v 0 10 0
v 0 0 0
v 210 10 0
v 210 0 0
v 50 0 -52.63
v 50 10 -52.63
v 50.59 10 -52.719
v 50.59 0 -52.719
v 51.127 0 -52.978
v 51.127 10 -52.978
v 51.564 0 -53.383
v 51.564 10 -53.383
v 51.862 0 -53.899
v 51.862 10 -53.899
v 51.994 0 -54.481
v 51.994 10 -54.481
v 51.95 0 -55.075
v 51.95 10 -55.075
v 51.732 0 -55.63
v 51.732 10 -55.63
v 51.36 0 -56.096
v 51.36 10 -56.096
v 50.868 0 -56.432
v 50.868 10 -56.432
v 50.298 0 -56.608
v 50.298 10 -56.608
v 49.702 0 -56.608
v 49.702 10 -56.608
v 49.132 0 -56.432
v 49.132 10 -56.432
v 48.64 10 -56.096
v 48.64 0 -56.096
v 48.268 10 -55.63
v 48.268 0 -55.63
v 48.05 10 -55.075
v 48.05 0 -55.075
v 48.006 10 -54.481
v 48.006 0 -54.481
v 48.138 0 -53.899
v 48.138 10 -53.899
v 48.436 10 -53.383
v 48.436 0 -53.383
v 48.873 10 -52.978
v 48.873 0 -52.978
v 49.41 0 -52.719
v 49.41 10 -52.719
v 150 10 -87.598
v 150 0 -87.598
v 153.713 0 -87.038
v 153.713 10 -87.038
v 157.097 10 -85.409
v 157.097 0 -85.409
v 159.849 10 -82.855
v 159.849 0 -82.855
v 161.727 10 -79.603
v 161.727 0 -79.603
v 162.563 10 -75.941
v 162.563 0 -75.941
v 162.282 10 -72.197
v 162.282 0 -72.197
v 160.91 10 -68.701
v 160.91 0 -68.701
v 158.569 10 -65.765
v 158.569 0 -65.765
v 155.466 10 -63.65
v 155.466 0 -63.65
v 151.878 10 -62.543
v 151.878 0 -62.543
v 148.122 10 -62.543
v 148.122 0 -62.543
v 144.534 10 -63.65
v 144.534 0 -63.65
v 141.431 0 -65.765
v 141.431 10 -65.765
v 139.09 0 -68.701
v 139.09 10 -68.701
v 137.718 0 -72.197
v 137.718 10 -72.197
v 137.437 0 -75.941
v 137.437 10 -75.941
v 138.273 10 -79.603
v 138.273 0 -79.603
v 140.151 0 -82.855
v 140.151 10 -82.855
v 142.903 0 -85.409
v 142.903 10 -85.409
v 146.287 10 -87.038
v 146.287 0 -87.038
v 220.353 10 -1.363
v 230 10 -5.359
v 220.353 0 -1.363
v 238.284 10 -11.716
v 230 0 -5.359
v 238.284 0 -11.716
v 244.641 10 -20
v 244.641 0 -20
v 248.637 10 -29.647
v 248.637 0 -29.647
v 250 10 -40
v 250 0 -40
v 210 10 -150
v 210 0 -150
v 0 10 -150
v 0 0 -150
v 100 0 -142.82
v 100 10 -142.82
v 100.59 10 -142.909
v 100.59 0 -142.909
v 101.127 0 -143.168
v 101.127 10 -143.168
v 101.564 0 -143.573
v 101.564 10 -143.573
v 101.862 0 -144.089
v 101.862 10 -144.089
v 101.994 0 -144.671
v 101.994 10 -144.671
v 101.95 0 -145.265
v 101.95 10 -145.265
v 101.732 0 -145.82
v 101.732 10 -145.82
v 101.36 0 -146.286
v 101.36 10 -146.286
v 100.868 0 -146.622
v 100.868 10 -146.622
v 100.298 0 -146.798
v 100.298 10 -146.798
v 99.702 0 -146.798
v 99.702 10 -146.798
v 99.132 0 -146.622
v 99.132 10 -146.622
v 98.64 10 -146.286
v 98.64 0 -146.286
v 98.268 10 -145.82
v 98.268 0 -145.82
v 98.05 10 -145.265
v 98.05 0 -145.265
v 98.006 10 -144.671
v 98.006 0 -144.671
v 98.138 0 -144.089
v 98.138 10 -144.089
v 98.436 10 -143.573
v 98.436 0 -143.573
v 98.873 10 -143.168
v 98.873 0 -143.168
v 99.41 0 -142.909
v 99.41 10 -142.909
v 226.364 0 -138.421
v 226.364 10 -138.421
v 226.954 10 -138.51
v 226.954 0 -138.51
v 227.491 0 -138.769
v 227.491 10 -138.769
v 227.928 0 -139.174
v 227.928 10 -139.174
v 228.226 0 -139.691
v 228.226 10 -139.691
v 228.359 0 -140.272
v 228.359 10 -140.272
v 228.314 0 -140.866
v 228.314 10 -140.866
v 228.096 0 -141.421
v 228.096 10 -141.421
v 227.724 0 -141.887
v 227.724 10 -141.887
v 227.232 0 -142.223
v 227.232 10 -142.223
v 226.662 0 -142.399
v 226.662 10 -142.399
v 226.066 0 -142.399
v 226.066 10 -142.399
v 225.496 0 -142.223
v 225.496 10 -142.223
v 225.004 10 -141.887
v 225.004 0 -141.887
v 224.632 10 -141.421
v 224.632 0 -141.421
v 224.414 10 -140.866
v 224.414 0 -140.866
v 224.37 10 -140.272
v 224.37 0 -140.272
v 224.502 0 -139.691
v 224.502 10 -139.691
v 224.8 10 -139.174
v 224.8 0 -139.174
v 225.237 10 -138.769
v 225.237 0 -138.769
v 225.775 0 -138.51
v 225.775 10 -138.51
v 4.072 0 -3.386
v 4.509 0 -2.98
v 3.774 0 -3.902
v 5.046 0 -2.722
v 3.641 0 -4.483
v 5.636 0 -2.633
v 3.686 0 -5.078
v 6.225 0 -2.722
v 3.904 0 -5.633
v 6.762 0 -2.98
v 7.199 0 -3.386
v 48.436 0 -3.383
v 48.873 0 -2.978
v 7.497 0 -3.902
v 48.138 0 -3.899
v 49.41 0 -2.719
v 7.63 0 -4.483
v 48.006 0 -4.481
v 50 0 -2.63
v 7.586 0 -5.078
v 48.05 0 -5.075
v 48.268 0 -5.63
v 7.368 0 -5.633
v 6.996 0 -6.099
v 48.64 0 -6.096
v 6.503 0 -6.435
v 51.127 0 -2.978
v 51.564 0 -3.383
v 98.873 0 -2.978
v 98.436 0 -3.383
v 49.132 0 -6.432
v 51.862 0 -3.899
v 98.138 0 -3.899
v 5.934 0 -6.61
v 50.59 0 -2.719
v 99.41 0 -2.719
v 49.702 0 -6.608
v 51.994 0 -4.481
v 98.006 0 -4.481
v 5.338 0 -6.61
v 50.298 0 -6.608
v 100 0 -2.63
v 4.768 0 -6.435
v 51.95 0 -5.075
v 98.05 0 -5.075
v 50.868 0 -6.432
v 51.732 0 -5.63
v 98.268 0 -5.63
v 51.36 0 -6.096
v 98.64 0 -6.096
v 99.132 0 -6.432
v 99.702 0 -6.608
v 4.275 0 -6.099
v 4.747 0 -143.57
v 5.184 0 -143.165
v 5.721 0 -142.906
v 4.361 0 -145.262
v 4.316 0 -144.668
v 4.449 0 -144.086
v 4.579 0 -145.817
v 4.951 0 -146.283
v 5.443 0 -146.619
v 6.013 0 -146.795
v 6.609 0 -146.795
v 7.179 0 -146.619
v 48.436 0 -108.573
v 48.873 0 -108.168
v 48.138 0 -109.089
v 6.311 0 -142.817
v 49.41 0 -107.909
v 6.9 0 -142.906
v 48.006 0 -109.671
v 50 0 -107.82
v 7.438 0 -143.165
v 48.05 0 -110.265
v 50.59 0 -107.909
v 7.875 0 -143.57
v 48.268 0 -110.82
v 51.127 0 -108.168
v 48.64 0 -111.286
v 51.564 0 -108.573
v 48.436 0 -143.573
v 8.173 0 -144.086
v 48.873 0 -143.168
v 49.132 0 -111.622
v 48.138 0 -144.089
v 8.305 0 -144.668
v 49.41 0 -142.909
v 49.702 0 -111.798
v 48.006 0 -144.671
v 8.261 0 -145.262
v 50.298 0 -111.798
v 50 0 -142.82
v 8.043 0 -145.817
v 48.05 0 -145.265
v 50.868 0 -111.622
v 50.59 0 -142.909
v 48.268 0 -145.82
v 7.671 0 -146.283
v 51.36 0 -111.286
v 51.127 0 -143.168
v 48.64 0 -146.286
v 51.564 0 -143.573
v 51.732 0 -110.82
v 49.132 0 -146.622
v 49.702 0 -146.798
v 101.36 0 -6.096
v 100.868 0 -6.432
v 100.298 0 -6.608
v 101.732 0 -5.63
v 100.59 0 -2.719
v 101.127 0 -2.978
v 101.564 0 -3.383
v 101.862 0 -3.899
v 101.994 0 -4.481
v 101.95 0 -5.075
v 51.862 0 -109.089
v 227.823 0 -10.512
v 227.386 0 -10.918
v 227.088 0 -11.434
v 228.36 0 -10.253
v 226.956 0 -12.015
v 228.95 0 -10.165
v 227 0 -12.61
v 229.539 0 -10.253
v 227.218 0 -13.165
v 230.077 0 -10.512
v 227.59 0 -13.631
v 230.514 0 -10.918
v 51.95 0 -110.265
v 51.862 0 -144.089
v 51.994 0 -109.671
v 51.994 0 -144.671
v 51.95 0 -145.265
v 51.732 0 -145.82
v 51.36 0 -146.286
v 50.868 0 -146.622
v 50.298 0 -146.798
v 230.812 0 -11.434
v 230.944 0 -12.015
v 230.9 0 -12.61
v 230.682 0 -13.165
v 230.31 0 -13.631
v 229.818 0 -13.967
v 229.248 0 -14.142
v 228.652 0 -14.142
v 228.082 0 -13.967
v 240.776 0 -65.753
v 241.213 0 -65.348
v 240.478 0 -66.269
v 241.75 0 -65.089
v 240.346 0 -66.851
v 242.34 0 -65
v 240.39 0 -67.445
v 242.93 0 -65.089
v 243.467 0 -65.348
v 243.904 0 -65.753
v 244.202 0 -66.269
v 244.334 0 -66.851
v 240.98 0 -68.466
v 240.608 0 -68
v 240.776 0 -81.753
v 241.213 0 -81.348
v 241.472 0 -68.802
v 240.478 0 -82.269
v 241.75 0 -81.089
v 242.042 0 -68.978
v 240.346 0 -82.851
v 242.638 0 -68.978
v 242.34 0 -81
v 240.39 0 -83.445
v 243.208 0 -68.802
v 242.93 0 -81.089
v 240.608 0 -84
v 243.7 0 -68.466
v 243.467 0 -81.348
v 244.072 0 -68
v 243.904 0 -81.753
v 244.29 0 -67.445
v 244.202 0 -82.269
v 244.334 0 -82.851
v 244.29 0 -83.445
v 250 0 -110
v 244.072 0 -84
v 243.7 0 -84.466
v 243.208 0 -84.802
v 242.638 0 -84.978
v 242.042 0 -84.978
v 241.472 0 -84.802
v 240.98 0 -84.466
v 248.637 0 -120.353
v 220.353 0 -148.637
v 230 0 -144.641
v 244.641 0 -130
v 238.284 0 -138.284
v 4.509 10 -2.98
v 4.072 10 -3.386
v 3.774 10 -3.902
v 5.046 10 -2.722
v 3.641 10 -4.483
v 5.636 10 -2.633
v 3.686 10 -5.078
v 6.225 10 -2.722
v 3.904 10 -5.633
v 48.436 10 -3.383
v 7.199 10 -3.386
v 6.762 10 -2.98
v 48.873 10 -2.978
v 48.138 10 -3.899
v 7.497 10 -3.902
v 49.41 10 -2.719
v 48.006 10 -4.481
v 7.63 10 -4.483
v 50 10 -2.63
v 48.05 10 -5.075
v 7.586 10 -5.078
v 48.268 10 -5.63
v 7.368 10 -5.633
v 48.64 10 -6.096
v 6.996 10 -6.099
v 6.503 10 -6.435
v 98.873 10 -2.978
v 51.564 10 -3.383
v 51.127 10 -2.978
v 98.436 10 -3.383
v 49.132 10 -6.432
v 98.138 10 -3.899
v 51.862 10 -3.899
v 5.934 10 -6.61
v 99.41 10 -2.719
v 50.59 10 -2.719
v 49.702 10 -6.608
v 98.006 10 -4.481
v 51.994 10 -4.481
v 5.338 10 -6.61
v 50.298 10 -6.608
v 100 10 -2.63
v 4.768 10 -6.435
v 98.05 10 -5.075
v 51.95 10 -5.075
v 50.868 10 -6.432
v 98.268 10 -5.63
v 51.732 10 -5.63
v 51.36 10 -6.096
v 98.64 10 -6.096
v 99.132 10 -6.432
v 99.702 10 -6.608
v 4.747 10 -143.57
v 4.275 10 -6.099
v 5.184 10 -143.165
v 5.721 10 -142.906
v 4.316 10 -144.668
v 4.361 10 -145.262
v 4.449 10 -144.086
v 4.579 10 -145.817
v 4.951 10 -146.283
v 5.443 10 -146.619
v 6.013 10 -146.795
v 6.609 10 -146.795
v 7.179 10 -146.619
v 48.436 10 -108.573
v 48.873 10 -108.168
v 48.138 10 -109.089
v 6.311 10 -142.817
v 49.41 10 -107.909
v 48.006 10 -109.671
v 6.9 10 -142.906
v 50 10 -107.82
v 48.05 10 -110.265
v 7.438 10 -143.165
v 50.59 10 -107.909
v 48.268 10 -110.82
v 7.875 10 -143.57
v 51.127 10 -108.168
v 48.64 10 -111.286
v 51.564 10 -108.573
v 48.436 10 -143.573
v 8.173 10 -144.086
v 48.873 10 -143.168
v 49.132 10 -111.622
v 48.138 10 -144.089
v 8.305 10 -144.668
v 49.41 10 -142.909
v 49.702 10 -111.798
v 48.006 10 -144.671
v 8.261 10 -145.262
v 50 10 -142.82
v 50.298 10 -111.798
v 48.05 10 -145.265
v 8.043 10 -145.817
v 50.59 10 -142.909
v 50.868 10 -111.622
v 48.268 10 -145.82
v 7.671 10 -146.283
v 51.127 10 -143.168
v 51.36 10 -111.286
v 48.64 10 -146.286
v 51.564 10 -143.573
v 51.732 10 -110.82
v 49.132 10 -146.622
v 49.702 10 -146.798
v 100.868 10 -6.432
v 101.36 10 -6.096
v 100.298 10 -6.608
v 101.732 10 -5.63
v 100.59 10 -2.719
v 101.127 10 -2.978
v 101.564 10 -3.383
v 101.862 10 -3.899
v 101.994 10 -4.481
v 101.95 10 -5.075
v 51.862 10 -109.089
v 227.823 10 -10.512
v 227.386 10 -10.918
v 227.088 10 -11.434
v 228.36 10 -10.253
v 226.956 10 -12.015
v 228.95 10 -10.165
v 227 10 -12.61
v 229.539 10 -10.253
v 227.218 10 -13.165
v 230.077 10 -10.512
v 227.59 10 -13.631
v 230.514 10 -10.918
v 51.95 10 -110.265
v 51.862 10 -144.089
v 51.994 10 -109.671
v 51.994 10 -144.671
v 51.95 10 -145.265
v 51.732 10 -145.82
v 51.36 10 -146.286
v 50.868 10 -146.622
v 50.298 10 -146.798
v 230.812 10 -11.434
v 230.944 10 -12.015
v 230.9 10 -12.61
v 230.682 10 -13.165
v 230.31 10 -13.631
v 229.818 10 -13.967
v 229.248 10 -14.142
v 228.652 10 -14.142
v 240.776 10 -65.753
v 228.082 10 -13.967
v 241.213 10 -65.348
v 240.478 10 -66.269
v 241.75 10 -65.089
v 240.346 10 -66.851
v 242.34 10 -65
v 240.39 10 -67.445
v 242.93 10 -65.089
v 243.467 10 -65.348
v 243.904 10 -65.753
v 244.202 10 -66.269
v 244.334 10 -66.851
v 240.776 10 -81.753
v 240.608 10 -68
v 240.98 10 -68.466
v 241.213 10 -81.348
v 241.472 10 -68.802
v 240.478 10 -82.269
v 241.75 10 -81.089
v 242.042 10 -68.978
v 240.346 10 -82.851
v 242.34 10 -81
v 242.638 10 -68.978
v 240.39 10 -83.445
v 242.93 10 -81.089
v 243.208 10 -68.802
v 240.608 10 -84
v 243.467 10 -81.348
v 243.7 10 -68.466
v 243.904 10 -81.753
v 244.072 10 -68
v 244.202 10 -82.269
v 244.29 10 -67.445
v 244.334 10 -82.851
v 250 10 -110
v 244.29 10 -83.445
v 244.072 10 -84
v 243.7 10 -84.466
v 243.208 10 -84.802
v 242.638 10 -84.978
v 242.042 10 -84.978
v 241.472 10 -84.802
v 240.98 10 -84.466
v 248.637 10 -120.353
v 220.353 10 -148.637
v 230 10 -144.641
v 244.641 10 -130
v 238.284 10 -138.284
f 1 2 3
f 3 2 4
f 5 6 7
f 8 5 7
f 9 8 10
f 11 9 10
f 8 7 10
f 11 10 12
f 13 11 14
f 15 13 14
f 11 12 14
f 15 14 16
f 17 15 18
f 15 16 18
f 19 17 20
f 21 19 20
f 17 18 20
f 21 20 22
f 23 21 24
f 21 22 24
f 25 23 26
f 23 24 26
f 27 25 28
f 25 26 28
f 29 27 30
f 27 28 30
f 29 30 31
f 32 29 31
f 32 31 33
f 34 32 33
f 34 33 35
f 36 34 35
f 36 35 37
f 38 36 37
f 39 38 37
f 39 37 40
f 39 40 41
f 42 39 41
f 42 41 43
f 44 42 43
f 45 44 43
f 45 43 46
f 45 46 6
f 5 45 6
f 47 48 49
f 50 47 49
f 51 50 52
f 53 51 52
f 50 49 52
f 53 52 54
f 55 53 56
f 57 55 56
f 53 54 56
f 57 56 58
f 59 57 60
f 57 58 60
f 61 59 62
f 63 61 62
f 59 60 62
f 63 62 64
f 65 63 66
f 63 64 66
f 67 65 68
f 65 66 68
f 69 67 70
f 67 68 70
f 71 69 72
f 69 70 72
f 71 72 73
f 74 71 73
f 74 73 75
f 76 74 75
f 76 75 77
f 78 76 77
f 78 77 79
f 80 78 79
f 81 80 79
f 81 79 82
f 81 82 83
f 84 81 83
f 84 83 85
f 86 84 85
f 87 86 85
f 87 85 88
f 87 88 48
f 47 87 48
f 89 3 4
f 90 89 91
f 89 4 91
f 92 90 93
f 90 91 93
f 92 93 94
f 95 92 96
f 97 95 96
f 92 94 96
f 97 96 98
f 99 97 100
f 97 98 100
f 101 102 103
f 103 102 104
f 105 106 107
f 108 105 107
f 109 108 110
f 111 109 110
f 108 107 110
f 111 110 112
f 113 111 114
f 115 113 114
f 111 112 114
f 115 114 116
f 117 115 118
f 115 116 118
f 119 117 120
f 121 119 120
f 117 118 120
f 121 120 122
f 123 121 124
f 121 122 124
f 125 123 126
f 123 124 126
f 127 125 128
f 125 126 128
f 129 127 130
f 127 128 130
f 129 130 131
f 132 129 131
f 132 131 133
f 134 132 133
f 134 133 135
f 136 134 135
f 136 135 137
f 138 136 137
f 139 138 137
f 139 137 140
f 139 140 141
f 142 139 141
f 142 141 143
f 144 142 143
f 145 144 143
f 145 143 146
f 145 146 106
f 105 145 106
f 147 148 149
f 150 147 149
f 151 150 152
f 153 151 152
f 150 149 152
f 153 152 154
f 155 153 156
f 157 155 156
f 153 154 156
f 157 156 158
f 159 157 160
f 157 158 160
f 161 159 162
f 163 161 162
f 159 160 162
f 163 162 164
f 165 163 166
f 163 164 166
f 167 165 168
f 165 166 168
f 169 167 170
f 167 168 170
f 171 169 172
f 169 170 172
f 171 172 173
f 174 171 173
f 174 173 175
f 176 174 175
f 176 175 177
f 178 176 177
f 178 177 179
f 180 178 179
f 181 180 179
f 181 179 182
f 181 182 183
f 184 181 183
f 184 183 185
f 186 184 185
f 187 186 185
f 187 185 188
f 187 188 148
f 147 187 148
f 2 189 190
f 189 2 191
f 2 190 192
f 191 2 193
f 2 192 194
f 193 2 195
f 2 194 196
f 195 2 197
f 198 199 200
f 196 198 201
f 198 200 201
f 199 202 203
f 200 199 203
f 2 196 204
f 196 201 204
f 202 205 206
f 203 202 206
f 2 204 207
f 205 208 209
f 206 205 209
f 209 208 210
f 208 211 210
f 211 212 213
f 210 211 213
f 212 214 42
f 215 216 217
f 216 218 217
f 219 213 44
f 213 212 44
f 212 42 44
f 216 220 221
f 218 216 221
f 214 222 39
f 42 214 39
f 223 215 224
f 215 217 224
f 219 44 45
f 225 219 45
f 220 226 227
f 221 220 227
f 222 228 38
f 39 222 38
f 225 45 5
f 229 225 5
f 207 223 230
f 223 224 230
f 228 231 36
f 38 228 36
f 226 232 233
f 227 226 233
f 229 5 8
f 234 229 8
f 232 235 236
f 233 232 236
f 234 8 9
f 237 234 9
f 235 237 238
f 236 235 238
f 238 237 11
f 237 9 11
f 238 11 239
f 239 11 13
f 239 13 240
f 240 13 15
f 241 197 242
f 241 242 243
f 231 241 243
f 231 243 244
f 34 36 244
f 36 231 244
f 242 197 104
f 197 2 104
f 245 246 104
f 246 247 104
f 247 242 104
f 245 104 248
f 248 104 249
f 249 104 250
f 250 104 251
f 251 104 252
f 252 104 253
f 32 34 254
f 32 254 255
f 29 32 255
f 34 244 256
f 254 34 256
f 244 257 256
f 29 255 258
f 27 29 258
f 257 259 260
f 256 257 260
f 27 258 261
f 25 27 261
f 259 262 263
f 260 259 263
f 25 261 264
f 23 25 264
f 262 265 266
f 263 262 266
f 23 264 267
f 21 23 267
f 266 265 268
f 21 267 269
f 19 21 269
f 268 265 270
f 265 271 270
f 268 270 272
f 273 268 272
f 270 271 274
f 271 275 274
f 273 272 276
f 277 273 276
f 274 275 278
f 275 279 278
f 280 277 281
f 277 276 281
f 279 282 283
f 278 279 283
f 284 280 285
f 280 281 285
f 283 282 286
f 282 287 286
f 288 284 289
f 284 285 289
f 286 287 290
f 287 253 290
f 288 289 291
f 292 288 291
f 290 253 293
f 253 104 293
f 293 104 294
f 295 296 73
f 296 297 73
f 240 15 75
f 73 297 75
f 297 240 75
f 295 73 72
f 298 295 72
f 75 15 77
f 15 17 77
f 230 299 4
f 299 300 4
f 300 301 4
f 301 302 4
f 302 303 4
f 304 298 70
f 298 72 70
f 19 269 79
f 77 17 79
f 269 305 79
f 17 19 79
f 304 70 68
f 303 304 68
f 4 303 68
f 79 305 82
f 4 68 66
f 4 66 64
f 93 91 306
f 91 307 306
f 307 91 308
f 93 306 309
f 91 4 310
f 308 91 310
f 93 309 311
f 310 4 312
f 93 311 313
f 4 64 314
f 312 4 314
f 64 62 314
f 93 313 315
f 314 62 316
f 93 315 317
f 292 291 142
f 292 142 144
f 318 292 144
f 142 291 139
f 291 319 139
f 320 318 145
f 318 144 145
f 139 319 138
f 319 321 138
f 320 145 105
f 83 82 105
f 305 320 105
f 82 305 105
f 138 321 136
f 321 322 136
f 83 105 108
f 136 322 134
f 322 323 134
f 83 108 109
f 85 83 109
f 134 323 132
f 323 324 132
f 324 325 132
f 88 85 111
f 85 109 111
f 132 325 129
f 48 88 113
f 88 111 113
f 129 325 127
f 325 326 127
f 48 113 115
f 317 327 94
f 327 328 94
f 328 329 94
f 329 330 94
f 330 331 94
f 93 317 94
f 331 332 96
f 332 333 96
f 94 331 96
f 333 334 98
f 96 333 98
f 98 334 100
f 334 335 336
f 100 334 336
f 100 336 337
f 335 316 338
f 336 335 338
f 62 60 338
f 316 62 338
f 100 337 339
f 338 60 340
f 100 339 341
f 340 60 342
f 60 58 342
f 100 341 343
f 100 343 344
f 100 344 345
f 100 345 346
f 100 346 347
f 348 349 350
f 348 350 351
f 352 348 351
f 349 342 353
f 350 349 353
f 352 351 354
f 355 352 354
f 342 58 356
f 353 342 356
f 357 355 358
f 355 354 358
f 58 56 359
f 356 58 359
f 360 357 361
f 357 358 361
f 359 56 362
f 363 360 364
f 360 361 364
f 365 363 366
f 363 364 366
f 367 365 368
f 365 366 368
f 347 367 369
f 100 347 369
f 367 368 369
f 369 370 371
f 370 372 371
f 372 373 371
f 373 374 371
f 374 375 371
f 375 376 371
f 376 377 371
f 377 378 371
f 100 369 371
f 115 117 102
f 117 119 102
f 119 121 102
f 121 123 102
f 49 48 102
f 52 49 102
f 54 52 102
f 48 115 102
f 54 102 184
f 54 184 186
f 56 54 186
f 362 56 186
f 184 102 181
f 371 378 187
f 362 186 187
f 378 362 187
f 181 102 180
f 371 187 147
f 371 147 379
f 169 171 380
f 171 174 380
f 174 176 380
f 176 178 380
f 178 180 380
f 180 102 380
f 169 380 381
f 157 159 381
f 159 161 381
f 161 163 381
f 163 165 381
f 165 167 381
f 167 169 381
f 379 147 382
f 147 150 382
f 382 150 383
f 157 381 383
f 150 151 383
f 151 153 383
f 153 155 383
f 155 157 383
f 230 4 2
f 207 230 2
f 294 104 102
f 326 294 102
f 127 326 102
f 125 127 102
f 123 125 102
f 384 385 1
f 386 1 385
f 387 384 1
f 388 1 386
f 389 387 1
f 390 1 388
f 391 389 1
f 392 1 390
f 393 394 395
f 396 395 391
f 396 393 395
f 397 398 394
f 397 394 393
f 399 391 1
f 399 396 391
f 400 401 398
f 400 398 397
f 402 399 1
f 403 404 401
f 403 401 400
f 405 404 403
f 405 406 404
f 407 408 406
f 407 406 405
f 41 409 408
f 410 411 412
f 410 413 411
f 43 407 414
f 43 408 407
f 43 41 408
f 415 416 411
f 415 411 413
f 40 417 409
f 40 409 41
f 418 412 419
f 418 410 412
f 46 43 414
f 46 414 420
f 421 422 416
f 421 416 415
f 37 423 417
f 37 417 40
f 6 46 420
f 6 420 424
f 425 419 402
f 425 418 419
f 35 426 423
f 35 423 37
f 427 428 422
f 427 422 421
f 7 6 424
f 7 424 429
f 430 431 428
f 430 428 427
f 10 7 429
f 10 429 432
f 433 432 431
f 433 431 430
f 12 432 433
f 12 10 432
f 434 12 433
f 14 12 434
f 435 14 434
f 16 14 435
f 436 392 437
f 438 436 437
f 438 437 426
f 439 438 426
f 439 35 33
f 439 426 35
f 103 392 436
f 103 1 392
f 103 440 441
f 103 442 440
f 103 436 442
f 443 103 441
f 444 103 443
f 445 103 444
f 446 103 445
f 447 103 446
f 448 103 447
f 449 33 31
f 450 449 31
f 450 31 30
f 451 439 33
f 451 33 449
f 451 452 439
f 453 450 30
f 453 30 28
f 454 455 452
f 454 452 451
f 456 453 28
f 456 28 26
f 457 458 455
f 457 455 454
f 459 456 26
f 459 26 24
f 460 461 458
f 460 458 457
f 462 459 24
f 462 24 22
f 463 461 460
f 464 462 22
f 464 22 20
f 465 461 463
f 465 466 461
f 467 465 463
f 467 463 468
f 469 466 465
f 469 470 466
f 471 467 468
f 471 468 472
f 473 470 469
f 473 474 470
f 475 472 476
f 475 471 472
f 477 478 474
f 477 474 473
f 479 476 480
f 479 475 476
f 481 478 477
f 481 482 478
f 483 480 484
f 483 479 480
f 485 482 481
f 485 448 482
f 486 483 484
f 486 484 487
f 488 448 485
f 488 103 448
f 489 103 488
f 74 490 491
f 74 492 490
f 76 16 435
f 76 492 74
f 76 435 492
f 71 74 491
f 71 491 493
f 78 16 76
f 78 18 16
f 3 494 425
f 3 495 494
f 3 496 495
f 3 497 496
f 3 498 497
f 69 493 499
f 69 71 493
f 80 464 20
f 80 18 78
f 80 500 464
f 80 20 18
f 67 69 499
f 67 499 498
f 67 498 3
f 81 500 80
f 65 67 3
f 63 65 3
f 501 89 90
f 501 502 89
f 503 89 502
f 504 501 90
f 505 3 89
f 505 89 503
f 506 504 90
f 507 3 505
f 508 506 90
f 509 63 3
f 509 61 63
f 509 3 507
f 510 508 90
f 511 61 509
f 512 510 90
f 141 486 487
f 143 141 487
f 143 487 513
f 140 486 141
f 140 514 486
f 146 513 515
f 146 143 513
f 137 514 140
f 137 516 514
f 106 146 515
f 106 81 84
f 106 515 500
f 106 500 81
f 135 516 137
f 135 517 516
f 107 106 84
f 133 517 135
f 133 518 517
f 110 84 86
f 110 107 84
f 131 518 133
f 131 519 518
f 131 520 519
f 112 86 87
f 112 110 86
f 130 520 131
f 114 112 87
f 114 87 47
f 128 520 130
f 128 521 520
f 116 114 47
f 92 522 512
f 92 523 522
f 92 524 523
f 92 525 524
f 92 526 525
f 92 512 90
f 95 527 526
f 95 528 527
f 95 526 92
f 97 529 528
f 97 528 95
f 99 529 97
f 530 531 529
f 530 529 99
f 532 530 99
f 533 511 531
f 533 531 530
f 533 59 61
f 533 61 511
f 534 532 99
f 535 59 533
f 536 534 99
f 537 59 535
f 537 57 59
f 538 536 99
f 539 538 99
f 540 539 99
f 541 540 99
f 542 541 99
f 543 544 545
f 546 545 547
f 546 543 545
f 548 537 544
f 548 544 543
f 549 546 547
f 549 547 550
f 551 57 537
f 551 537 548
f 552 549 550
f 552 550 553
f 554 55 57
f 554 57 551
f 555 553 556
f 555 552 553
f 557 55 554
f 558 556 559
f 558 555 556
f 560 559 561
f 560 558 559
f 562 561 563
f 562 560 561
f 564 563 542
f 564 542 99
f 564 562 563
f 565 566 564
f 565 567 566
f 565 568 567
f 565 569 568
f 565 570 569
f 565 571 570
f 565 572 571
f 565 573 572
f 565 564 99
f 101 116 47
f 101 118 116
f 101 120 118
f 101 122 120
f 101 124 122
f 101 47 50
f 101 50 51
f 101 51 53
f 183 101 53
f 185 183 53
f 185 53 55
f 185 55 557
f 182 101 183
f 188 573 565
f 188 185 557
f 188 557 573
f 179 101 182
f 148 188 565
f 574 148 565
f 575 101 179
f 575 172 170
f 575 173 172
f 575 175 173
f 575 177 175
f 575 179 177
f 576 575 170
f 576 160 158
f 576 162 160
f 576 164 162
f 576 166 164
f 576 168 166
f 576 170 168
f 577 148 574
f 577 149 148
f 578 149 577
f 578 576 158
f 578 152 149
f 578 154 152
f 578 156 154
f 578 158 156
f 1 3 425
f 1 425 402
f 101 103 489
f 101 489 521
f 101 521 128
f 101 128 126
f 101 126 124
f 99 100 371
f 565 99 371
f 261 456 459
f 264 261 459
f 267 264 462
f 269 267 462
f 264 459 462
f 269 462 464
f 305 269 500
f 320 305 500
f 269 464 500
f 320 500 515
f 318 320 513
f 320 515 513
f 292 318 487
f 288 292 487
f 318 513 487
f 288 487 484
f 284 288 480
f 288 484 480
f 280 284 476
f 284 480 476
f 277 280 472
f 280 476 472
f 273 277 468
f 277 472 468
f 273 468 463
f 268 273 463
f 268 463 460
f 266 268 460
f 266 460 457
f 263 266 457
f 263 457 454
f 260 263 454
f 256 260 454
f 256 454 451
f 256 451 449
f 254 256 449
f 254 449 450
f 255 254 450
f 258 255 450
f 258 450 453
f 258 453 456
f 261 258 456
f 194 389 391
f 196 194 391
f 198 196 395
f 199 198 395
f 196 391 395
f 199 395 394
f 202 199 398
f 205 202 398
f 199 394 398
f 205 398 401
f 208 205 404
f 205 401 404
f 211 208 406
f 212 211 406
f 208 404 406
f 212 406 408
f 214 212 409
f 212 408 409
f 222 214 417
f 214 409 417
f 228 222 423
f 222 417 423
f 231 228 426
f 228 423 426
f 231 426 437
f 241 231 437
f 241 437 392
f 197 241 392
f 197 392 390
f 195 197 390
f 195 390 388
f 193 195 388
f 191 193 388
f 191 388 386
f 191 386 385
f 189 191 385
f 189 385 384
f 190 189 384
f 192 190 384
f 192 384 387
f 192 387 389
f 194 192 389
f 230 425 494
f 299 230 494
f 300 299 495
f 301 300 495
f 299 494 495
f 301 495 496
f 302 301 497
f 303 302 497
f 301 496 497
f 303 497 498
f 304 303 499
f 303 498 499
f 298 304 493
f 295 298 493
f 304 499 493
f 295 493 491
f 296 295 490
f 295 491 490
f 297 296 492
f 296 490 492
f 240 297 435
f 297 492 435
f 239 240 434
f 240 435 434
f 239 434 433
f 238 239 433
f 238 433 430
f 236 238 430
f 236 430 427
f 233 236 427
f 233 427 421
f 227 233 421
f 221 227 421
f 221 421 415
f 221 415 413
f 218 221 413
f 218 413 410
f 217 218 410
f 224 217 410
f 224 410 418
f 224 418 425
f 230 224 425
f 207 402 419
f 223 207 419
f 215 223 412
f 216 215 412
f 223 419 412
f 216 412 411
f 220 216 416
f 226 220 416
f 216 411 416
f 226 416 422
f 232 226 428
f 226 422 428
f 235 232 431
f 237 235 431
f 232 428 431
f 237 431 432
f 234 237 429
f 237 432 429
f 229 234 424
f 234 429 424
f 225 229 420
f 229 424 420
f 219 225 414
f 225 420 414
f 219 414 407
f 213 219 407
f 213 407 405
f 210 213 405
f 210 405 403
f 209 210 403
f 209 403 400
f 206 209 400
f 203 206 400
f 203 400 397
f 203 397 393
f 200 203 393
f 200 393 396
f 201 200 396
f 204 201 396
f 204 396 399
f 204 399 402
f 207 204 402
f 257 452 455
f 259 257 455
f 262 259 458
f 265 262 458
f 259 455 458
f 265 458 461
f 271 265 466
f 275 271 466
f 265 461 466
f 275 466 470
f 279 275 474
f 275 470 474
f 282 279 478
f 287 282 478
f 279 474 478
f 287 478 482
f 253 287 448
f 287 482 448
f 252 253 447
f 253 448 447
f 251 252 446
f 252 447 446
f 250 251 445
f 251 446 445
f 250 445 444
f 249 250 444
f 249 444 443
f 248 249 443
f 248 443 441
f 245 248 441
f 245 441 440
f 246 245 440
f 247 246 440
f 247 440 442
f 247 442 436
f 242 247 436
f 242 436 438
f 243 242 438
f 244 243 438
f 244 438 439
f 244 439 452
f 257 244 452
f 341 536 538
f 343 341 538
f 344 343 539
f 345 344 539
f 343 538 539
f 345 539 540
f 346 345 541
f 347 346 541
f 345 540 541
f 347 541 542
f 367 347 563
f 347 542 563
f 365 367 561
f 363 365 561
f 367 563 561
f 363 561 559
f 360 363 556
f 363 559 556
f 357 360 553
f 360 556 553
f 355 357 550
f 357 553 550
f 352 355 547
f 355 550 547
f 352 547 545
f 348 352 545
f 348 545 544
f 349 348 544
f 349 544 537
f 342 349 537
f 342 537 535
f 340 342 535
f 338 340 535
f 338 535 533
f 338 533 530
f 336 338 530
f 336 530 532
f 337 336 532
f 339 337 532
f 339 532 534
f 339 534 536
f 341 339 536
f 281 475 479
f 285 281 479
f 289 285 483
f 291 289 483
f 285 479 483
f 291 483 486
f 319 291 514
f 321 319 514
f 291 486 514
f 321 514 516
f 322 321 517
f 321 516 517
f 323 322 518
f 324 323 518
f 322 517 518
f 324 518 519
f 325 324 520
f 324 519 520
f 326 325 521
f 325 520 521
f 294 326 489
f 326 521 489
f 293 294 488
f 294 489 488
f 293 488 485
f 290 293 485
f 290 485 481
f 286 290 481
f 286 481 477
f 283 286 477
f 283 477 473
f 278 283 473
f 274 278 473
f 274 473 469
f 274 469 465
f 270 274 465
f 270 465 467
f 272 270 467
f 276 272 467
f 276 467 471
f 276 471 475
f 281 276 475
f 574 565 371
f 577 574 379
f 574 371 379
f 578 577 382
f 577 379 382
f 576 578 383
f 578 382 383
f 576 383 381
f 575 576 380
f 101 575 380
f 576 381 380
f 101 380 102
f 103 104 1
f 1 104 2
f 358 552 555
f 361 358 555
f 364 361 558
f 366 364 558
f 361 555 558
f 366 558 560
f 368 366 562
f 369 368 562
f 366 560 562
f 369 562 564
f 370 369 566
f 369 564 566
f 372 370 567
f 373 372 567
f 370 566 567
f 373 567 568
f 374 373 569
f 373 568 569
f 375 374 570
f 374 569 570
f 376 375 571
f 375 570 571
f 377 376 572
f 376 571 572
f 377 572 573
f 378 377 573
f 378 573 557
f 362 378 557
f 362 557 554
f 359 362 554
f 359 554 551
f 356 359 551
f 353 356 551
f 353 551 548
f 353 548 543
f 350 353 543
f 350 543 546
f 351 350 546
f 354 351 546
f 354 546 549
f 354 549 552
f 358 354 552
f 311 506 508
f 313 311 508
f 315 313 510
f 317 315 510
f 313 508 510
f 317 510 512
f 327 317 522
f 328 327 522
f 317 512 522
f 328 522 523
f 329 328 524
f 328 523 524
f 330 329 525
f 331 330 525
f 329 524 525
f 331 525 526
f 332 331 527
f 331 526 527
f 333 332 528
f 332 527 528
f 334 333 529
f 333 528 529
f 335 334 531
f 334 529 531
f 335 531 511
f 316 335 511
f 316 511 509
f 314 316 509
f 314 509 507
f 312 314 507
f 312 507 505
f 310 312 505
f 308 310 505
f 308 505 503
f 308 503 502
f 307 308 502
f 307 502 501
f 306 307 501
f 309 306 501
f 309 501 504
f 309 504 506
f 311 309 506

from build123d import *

# Parameters (mm, degrees)
BOSS_EXTRUDE1_DEPTH = 10
SKETCH2_R           = 12.59794853
CUT_EXTRUDE1_DEPTH  = 292.719042916
SKETCH3_R           = 2
CUT_EXTRUDE10_DEPTH = 292.719042916
SKETCH4_R           = 2
CUT_EXTRUDE11_DEPTH = 292.719042916
SKETCH5_R           = 2
CUT_EXTRUDE12_DEPTH = 292.719042916
SKETCH6_R           = 2
CUT_EXTRUDE13_DEPTH = 292.719042916
SKETCH10_R          = 2
CUT_EXTRUDE15_DEPTH = 292.719042916
SKETCH11_R          = 2
CUT_EXTRUDE16_DEPTH = 292.719042916


with BuildPart() as part:
    # Sketch1 → Boss-Extrude1 (new body)
    with BuildSketch(Plane(origin=(0, 0, 0), x_dir=(1, 0, 0), z_dir=(0, 1, 0))):
        with BuildLine():
            Line((0, 0), (210, 0))
            ThreePointArc((210, 0), (238.284271247, 11.715728753), (250, 40))
            Line((250, 40), (250, 110))
            ThreePointArc((250, 110), (238.284271247, 138.284271247), (210, 150))
            Line((210, 150), (0, 150))
            Line((0, 150), (0, 0))
        make_face()
    extrude(amount=BOSS_EXTRUDE1_DEPTH)

    # Sketch2 → Cut-Extrude1 (cut, through all)
    with BuildSketch(Plane.XZ):
        with Locations(Location((150, -75, 0), (0, 0, 270))):
            Circle(SKETCH2_R)
    extrude(amount=-CUT_EXTRUDE1_DEPTH, mode=Mode.SUBTRACT)

    # Sketch3 → Cut-Extrude10 (cut, through all)
    with BuildSketch(Plane(origin=(0, 10, 0), x_dir=(1, 0, 0), z_dir=(0, 1, 0))):
        with Locations(Location((6.310878228, 144.817130454, 0), (0, 0, 270))):
            Circle(SKETCH3_R)
    extrude(amount=-CUT_EXTRUDE10_DEPTH, mode=Mode.SUBTRACT)

    # Sketch4 → Cut-Extrude11 (cut, through all)
    with BuildSketch(Plane(origin=(0, 10, 0), x_dir=(1, 0, 0), z_dir=(0, 1, 0))):
        with Locations(Location((5.635720357, 4.632829204, 0), (0, 0, 270))):
            Circle(SKETCH4_R)
    extrude(amount=-CUT_EXTRUDE11_DEPTH, mode=Mode.SUBTRACT)

    # Sketch5 → Cut-Extrude12 (cut, through all)
    with BuildSketch(Plane(origin=(0, 10, 0), x_dir=(1, 0, 0), z_dir=(0, 1, 0))):
        with Locations(Location((226.364130141, 140.421237055, 0), (0, 0, 270))):
            Circle(SKETCH5_R)
    extrude(amount=-CUT_EXTRUDE12_DEPTH, mode=Mode.SUBTRACT)

    # Sketch6 → Cut-Extrude13 (cut, through all)
    with BuildSketch(Plane(origin=(0, 10, 0), x_dir=(1, 0, 0), z_dir=(0, 1, 0))):
        with Locations(Location((228.949949788, 12.164582591, 0), (0, 0, 270))):
            Circle(SKETCH6_R)
    extrude(amount=-CUT_EXTRUDE13_DEPTH, mode=Mode.SUBTRACT)

    # Sketch10 → Cut-Extrude15 (cut, through all)
    with BuildSketch(Plane(origin=(0, 10, 0), x_dir=(1, 0, 0), z_dir=(0, 1, 0))):
        with Locations(Location((50, 144.82, 0), (0, 0, 270))):
            Circle(SKETCH10_R)
        with Locations(Location((50, 4.63, 0), (0, 0, 270))):
            Circle(SKETCH10_R)
        with Locations(Location((100, 4.63, 0), (0, 0, 270))):
            Circle(SKETCH10_R)
        with Locations(Location((100, 144.82, 0), (0, 0, 270))):
            Circle(SKETCH10_R)
        with Locations(Location((50, 109.82, 0), (0, 0, 270))):
            Circle(SKETCH10_R)
        with Locations(Location((50, 54.63, 0), (0, 0, 270))):
            Circle(SKETCH10_R)
    extrude(amount=-CUT_EXTRUDE15_DEPTH, mode=Mode.SUBTRACT)

    # Sketch11 → Cut-Extrude16 (cut, through all)
    with BuildSketch(Plane(origin=(0, 10, 0), x_dir=(1, 0, 0), z_dir=(0, 1, 0))):
        with Locations(Location((242.34, 83, 0), (0, 0, 270))):
            Circle(SKETCH11_R)
        with Locations(Location((242.34, 67, 0), (0, 0, 270))):
            Circle(SKETCH11_R)
    extrude(amount=-CUT_EXTRUDE16_DEPTH, mode=Mode.SUBTRACT)


solid = part.part
